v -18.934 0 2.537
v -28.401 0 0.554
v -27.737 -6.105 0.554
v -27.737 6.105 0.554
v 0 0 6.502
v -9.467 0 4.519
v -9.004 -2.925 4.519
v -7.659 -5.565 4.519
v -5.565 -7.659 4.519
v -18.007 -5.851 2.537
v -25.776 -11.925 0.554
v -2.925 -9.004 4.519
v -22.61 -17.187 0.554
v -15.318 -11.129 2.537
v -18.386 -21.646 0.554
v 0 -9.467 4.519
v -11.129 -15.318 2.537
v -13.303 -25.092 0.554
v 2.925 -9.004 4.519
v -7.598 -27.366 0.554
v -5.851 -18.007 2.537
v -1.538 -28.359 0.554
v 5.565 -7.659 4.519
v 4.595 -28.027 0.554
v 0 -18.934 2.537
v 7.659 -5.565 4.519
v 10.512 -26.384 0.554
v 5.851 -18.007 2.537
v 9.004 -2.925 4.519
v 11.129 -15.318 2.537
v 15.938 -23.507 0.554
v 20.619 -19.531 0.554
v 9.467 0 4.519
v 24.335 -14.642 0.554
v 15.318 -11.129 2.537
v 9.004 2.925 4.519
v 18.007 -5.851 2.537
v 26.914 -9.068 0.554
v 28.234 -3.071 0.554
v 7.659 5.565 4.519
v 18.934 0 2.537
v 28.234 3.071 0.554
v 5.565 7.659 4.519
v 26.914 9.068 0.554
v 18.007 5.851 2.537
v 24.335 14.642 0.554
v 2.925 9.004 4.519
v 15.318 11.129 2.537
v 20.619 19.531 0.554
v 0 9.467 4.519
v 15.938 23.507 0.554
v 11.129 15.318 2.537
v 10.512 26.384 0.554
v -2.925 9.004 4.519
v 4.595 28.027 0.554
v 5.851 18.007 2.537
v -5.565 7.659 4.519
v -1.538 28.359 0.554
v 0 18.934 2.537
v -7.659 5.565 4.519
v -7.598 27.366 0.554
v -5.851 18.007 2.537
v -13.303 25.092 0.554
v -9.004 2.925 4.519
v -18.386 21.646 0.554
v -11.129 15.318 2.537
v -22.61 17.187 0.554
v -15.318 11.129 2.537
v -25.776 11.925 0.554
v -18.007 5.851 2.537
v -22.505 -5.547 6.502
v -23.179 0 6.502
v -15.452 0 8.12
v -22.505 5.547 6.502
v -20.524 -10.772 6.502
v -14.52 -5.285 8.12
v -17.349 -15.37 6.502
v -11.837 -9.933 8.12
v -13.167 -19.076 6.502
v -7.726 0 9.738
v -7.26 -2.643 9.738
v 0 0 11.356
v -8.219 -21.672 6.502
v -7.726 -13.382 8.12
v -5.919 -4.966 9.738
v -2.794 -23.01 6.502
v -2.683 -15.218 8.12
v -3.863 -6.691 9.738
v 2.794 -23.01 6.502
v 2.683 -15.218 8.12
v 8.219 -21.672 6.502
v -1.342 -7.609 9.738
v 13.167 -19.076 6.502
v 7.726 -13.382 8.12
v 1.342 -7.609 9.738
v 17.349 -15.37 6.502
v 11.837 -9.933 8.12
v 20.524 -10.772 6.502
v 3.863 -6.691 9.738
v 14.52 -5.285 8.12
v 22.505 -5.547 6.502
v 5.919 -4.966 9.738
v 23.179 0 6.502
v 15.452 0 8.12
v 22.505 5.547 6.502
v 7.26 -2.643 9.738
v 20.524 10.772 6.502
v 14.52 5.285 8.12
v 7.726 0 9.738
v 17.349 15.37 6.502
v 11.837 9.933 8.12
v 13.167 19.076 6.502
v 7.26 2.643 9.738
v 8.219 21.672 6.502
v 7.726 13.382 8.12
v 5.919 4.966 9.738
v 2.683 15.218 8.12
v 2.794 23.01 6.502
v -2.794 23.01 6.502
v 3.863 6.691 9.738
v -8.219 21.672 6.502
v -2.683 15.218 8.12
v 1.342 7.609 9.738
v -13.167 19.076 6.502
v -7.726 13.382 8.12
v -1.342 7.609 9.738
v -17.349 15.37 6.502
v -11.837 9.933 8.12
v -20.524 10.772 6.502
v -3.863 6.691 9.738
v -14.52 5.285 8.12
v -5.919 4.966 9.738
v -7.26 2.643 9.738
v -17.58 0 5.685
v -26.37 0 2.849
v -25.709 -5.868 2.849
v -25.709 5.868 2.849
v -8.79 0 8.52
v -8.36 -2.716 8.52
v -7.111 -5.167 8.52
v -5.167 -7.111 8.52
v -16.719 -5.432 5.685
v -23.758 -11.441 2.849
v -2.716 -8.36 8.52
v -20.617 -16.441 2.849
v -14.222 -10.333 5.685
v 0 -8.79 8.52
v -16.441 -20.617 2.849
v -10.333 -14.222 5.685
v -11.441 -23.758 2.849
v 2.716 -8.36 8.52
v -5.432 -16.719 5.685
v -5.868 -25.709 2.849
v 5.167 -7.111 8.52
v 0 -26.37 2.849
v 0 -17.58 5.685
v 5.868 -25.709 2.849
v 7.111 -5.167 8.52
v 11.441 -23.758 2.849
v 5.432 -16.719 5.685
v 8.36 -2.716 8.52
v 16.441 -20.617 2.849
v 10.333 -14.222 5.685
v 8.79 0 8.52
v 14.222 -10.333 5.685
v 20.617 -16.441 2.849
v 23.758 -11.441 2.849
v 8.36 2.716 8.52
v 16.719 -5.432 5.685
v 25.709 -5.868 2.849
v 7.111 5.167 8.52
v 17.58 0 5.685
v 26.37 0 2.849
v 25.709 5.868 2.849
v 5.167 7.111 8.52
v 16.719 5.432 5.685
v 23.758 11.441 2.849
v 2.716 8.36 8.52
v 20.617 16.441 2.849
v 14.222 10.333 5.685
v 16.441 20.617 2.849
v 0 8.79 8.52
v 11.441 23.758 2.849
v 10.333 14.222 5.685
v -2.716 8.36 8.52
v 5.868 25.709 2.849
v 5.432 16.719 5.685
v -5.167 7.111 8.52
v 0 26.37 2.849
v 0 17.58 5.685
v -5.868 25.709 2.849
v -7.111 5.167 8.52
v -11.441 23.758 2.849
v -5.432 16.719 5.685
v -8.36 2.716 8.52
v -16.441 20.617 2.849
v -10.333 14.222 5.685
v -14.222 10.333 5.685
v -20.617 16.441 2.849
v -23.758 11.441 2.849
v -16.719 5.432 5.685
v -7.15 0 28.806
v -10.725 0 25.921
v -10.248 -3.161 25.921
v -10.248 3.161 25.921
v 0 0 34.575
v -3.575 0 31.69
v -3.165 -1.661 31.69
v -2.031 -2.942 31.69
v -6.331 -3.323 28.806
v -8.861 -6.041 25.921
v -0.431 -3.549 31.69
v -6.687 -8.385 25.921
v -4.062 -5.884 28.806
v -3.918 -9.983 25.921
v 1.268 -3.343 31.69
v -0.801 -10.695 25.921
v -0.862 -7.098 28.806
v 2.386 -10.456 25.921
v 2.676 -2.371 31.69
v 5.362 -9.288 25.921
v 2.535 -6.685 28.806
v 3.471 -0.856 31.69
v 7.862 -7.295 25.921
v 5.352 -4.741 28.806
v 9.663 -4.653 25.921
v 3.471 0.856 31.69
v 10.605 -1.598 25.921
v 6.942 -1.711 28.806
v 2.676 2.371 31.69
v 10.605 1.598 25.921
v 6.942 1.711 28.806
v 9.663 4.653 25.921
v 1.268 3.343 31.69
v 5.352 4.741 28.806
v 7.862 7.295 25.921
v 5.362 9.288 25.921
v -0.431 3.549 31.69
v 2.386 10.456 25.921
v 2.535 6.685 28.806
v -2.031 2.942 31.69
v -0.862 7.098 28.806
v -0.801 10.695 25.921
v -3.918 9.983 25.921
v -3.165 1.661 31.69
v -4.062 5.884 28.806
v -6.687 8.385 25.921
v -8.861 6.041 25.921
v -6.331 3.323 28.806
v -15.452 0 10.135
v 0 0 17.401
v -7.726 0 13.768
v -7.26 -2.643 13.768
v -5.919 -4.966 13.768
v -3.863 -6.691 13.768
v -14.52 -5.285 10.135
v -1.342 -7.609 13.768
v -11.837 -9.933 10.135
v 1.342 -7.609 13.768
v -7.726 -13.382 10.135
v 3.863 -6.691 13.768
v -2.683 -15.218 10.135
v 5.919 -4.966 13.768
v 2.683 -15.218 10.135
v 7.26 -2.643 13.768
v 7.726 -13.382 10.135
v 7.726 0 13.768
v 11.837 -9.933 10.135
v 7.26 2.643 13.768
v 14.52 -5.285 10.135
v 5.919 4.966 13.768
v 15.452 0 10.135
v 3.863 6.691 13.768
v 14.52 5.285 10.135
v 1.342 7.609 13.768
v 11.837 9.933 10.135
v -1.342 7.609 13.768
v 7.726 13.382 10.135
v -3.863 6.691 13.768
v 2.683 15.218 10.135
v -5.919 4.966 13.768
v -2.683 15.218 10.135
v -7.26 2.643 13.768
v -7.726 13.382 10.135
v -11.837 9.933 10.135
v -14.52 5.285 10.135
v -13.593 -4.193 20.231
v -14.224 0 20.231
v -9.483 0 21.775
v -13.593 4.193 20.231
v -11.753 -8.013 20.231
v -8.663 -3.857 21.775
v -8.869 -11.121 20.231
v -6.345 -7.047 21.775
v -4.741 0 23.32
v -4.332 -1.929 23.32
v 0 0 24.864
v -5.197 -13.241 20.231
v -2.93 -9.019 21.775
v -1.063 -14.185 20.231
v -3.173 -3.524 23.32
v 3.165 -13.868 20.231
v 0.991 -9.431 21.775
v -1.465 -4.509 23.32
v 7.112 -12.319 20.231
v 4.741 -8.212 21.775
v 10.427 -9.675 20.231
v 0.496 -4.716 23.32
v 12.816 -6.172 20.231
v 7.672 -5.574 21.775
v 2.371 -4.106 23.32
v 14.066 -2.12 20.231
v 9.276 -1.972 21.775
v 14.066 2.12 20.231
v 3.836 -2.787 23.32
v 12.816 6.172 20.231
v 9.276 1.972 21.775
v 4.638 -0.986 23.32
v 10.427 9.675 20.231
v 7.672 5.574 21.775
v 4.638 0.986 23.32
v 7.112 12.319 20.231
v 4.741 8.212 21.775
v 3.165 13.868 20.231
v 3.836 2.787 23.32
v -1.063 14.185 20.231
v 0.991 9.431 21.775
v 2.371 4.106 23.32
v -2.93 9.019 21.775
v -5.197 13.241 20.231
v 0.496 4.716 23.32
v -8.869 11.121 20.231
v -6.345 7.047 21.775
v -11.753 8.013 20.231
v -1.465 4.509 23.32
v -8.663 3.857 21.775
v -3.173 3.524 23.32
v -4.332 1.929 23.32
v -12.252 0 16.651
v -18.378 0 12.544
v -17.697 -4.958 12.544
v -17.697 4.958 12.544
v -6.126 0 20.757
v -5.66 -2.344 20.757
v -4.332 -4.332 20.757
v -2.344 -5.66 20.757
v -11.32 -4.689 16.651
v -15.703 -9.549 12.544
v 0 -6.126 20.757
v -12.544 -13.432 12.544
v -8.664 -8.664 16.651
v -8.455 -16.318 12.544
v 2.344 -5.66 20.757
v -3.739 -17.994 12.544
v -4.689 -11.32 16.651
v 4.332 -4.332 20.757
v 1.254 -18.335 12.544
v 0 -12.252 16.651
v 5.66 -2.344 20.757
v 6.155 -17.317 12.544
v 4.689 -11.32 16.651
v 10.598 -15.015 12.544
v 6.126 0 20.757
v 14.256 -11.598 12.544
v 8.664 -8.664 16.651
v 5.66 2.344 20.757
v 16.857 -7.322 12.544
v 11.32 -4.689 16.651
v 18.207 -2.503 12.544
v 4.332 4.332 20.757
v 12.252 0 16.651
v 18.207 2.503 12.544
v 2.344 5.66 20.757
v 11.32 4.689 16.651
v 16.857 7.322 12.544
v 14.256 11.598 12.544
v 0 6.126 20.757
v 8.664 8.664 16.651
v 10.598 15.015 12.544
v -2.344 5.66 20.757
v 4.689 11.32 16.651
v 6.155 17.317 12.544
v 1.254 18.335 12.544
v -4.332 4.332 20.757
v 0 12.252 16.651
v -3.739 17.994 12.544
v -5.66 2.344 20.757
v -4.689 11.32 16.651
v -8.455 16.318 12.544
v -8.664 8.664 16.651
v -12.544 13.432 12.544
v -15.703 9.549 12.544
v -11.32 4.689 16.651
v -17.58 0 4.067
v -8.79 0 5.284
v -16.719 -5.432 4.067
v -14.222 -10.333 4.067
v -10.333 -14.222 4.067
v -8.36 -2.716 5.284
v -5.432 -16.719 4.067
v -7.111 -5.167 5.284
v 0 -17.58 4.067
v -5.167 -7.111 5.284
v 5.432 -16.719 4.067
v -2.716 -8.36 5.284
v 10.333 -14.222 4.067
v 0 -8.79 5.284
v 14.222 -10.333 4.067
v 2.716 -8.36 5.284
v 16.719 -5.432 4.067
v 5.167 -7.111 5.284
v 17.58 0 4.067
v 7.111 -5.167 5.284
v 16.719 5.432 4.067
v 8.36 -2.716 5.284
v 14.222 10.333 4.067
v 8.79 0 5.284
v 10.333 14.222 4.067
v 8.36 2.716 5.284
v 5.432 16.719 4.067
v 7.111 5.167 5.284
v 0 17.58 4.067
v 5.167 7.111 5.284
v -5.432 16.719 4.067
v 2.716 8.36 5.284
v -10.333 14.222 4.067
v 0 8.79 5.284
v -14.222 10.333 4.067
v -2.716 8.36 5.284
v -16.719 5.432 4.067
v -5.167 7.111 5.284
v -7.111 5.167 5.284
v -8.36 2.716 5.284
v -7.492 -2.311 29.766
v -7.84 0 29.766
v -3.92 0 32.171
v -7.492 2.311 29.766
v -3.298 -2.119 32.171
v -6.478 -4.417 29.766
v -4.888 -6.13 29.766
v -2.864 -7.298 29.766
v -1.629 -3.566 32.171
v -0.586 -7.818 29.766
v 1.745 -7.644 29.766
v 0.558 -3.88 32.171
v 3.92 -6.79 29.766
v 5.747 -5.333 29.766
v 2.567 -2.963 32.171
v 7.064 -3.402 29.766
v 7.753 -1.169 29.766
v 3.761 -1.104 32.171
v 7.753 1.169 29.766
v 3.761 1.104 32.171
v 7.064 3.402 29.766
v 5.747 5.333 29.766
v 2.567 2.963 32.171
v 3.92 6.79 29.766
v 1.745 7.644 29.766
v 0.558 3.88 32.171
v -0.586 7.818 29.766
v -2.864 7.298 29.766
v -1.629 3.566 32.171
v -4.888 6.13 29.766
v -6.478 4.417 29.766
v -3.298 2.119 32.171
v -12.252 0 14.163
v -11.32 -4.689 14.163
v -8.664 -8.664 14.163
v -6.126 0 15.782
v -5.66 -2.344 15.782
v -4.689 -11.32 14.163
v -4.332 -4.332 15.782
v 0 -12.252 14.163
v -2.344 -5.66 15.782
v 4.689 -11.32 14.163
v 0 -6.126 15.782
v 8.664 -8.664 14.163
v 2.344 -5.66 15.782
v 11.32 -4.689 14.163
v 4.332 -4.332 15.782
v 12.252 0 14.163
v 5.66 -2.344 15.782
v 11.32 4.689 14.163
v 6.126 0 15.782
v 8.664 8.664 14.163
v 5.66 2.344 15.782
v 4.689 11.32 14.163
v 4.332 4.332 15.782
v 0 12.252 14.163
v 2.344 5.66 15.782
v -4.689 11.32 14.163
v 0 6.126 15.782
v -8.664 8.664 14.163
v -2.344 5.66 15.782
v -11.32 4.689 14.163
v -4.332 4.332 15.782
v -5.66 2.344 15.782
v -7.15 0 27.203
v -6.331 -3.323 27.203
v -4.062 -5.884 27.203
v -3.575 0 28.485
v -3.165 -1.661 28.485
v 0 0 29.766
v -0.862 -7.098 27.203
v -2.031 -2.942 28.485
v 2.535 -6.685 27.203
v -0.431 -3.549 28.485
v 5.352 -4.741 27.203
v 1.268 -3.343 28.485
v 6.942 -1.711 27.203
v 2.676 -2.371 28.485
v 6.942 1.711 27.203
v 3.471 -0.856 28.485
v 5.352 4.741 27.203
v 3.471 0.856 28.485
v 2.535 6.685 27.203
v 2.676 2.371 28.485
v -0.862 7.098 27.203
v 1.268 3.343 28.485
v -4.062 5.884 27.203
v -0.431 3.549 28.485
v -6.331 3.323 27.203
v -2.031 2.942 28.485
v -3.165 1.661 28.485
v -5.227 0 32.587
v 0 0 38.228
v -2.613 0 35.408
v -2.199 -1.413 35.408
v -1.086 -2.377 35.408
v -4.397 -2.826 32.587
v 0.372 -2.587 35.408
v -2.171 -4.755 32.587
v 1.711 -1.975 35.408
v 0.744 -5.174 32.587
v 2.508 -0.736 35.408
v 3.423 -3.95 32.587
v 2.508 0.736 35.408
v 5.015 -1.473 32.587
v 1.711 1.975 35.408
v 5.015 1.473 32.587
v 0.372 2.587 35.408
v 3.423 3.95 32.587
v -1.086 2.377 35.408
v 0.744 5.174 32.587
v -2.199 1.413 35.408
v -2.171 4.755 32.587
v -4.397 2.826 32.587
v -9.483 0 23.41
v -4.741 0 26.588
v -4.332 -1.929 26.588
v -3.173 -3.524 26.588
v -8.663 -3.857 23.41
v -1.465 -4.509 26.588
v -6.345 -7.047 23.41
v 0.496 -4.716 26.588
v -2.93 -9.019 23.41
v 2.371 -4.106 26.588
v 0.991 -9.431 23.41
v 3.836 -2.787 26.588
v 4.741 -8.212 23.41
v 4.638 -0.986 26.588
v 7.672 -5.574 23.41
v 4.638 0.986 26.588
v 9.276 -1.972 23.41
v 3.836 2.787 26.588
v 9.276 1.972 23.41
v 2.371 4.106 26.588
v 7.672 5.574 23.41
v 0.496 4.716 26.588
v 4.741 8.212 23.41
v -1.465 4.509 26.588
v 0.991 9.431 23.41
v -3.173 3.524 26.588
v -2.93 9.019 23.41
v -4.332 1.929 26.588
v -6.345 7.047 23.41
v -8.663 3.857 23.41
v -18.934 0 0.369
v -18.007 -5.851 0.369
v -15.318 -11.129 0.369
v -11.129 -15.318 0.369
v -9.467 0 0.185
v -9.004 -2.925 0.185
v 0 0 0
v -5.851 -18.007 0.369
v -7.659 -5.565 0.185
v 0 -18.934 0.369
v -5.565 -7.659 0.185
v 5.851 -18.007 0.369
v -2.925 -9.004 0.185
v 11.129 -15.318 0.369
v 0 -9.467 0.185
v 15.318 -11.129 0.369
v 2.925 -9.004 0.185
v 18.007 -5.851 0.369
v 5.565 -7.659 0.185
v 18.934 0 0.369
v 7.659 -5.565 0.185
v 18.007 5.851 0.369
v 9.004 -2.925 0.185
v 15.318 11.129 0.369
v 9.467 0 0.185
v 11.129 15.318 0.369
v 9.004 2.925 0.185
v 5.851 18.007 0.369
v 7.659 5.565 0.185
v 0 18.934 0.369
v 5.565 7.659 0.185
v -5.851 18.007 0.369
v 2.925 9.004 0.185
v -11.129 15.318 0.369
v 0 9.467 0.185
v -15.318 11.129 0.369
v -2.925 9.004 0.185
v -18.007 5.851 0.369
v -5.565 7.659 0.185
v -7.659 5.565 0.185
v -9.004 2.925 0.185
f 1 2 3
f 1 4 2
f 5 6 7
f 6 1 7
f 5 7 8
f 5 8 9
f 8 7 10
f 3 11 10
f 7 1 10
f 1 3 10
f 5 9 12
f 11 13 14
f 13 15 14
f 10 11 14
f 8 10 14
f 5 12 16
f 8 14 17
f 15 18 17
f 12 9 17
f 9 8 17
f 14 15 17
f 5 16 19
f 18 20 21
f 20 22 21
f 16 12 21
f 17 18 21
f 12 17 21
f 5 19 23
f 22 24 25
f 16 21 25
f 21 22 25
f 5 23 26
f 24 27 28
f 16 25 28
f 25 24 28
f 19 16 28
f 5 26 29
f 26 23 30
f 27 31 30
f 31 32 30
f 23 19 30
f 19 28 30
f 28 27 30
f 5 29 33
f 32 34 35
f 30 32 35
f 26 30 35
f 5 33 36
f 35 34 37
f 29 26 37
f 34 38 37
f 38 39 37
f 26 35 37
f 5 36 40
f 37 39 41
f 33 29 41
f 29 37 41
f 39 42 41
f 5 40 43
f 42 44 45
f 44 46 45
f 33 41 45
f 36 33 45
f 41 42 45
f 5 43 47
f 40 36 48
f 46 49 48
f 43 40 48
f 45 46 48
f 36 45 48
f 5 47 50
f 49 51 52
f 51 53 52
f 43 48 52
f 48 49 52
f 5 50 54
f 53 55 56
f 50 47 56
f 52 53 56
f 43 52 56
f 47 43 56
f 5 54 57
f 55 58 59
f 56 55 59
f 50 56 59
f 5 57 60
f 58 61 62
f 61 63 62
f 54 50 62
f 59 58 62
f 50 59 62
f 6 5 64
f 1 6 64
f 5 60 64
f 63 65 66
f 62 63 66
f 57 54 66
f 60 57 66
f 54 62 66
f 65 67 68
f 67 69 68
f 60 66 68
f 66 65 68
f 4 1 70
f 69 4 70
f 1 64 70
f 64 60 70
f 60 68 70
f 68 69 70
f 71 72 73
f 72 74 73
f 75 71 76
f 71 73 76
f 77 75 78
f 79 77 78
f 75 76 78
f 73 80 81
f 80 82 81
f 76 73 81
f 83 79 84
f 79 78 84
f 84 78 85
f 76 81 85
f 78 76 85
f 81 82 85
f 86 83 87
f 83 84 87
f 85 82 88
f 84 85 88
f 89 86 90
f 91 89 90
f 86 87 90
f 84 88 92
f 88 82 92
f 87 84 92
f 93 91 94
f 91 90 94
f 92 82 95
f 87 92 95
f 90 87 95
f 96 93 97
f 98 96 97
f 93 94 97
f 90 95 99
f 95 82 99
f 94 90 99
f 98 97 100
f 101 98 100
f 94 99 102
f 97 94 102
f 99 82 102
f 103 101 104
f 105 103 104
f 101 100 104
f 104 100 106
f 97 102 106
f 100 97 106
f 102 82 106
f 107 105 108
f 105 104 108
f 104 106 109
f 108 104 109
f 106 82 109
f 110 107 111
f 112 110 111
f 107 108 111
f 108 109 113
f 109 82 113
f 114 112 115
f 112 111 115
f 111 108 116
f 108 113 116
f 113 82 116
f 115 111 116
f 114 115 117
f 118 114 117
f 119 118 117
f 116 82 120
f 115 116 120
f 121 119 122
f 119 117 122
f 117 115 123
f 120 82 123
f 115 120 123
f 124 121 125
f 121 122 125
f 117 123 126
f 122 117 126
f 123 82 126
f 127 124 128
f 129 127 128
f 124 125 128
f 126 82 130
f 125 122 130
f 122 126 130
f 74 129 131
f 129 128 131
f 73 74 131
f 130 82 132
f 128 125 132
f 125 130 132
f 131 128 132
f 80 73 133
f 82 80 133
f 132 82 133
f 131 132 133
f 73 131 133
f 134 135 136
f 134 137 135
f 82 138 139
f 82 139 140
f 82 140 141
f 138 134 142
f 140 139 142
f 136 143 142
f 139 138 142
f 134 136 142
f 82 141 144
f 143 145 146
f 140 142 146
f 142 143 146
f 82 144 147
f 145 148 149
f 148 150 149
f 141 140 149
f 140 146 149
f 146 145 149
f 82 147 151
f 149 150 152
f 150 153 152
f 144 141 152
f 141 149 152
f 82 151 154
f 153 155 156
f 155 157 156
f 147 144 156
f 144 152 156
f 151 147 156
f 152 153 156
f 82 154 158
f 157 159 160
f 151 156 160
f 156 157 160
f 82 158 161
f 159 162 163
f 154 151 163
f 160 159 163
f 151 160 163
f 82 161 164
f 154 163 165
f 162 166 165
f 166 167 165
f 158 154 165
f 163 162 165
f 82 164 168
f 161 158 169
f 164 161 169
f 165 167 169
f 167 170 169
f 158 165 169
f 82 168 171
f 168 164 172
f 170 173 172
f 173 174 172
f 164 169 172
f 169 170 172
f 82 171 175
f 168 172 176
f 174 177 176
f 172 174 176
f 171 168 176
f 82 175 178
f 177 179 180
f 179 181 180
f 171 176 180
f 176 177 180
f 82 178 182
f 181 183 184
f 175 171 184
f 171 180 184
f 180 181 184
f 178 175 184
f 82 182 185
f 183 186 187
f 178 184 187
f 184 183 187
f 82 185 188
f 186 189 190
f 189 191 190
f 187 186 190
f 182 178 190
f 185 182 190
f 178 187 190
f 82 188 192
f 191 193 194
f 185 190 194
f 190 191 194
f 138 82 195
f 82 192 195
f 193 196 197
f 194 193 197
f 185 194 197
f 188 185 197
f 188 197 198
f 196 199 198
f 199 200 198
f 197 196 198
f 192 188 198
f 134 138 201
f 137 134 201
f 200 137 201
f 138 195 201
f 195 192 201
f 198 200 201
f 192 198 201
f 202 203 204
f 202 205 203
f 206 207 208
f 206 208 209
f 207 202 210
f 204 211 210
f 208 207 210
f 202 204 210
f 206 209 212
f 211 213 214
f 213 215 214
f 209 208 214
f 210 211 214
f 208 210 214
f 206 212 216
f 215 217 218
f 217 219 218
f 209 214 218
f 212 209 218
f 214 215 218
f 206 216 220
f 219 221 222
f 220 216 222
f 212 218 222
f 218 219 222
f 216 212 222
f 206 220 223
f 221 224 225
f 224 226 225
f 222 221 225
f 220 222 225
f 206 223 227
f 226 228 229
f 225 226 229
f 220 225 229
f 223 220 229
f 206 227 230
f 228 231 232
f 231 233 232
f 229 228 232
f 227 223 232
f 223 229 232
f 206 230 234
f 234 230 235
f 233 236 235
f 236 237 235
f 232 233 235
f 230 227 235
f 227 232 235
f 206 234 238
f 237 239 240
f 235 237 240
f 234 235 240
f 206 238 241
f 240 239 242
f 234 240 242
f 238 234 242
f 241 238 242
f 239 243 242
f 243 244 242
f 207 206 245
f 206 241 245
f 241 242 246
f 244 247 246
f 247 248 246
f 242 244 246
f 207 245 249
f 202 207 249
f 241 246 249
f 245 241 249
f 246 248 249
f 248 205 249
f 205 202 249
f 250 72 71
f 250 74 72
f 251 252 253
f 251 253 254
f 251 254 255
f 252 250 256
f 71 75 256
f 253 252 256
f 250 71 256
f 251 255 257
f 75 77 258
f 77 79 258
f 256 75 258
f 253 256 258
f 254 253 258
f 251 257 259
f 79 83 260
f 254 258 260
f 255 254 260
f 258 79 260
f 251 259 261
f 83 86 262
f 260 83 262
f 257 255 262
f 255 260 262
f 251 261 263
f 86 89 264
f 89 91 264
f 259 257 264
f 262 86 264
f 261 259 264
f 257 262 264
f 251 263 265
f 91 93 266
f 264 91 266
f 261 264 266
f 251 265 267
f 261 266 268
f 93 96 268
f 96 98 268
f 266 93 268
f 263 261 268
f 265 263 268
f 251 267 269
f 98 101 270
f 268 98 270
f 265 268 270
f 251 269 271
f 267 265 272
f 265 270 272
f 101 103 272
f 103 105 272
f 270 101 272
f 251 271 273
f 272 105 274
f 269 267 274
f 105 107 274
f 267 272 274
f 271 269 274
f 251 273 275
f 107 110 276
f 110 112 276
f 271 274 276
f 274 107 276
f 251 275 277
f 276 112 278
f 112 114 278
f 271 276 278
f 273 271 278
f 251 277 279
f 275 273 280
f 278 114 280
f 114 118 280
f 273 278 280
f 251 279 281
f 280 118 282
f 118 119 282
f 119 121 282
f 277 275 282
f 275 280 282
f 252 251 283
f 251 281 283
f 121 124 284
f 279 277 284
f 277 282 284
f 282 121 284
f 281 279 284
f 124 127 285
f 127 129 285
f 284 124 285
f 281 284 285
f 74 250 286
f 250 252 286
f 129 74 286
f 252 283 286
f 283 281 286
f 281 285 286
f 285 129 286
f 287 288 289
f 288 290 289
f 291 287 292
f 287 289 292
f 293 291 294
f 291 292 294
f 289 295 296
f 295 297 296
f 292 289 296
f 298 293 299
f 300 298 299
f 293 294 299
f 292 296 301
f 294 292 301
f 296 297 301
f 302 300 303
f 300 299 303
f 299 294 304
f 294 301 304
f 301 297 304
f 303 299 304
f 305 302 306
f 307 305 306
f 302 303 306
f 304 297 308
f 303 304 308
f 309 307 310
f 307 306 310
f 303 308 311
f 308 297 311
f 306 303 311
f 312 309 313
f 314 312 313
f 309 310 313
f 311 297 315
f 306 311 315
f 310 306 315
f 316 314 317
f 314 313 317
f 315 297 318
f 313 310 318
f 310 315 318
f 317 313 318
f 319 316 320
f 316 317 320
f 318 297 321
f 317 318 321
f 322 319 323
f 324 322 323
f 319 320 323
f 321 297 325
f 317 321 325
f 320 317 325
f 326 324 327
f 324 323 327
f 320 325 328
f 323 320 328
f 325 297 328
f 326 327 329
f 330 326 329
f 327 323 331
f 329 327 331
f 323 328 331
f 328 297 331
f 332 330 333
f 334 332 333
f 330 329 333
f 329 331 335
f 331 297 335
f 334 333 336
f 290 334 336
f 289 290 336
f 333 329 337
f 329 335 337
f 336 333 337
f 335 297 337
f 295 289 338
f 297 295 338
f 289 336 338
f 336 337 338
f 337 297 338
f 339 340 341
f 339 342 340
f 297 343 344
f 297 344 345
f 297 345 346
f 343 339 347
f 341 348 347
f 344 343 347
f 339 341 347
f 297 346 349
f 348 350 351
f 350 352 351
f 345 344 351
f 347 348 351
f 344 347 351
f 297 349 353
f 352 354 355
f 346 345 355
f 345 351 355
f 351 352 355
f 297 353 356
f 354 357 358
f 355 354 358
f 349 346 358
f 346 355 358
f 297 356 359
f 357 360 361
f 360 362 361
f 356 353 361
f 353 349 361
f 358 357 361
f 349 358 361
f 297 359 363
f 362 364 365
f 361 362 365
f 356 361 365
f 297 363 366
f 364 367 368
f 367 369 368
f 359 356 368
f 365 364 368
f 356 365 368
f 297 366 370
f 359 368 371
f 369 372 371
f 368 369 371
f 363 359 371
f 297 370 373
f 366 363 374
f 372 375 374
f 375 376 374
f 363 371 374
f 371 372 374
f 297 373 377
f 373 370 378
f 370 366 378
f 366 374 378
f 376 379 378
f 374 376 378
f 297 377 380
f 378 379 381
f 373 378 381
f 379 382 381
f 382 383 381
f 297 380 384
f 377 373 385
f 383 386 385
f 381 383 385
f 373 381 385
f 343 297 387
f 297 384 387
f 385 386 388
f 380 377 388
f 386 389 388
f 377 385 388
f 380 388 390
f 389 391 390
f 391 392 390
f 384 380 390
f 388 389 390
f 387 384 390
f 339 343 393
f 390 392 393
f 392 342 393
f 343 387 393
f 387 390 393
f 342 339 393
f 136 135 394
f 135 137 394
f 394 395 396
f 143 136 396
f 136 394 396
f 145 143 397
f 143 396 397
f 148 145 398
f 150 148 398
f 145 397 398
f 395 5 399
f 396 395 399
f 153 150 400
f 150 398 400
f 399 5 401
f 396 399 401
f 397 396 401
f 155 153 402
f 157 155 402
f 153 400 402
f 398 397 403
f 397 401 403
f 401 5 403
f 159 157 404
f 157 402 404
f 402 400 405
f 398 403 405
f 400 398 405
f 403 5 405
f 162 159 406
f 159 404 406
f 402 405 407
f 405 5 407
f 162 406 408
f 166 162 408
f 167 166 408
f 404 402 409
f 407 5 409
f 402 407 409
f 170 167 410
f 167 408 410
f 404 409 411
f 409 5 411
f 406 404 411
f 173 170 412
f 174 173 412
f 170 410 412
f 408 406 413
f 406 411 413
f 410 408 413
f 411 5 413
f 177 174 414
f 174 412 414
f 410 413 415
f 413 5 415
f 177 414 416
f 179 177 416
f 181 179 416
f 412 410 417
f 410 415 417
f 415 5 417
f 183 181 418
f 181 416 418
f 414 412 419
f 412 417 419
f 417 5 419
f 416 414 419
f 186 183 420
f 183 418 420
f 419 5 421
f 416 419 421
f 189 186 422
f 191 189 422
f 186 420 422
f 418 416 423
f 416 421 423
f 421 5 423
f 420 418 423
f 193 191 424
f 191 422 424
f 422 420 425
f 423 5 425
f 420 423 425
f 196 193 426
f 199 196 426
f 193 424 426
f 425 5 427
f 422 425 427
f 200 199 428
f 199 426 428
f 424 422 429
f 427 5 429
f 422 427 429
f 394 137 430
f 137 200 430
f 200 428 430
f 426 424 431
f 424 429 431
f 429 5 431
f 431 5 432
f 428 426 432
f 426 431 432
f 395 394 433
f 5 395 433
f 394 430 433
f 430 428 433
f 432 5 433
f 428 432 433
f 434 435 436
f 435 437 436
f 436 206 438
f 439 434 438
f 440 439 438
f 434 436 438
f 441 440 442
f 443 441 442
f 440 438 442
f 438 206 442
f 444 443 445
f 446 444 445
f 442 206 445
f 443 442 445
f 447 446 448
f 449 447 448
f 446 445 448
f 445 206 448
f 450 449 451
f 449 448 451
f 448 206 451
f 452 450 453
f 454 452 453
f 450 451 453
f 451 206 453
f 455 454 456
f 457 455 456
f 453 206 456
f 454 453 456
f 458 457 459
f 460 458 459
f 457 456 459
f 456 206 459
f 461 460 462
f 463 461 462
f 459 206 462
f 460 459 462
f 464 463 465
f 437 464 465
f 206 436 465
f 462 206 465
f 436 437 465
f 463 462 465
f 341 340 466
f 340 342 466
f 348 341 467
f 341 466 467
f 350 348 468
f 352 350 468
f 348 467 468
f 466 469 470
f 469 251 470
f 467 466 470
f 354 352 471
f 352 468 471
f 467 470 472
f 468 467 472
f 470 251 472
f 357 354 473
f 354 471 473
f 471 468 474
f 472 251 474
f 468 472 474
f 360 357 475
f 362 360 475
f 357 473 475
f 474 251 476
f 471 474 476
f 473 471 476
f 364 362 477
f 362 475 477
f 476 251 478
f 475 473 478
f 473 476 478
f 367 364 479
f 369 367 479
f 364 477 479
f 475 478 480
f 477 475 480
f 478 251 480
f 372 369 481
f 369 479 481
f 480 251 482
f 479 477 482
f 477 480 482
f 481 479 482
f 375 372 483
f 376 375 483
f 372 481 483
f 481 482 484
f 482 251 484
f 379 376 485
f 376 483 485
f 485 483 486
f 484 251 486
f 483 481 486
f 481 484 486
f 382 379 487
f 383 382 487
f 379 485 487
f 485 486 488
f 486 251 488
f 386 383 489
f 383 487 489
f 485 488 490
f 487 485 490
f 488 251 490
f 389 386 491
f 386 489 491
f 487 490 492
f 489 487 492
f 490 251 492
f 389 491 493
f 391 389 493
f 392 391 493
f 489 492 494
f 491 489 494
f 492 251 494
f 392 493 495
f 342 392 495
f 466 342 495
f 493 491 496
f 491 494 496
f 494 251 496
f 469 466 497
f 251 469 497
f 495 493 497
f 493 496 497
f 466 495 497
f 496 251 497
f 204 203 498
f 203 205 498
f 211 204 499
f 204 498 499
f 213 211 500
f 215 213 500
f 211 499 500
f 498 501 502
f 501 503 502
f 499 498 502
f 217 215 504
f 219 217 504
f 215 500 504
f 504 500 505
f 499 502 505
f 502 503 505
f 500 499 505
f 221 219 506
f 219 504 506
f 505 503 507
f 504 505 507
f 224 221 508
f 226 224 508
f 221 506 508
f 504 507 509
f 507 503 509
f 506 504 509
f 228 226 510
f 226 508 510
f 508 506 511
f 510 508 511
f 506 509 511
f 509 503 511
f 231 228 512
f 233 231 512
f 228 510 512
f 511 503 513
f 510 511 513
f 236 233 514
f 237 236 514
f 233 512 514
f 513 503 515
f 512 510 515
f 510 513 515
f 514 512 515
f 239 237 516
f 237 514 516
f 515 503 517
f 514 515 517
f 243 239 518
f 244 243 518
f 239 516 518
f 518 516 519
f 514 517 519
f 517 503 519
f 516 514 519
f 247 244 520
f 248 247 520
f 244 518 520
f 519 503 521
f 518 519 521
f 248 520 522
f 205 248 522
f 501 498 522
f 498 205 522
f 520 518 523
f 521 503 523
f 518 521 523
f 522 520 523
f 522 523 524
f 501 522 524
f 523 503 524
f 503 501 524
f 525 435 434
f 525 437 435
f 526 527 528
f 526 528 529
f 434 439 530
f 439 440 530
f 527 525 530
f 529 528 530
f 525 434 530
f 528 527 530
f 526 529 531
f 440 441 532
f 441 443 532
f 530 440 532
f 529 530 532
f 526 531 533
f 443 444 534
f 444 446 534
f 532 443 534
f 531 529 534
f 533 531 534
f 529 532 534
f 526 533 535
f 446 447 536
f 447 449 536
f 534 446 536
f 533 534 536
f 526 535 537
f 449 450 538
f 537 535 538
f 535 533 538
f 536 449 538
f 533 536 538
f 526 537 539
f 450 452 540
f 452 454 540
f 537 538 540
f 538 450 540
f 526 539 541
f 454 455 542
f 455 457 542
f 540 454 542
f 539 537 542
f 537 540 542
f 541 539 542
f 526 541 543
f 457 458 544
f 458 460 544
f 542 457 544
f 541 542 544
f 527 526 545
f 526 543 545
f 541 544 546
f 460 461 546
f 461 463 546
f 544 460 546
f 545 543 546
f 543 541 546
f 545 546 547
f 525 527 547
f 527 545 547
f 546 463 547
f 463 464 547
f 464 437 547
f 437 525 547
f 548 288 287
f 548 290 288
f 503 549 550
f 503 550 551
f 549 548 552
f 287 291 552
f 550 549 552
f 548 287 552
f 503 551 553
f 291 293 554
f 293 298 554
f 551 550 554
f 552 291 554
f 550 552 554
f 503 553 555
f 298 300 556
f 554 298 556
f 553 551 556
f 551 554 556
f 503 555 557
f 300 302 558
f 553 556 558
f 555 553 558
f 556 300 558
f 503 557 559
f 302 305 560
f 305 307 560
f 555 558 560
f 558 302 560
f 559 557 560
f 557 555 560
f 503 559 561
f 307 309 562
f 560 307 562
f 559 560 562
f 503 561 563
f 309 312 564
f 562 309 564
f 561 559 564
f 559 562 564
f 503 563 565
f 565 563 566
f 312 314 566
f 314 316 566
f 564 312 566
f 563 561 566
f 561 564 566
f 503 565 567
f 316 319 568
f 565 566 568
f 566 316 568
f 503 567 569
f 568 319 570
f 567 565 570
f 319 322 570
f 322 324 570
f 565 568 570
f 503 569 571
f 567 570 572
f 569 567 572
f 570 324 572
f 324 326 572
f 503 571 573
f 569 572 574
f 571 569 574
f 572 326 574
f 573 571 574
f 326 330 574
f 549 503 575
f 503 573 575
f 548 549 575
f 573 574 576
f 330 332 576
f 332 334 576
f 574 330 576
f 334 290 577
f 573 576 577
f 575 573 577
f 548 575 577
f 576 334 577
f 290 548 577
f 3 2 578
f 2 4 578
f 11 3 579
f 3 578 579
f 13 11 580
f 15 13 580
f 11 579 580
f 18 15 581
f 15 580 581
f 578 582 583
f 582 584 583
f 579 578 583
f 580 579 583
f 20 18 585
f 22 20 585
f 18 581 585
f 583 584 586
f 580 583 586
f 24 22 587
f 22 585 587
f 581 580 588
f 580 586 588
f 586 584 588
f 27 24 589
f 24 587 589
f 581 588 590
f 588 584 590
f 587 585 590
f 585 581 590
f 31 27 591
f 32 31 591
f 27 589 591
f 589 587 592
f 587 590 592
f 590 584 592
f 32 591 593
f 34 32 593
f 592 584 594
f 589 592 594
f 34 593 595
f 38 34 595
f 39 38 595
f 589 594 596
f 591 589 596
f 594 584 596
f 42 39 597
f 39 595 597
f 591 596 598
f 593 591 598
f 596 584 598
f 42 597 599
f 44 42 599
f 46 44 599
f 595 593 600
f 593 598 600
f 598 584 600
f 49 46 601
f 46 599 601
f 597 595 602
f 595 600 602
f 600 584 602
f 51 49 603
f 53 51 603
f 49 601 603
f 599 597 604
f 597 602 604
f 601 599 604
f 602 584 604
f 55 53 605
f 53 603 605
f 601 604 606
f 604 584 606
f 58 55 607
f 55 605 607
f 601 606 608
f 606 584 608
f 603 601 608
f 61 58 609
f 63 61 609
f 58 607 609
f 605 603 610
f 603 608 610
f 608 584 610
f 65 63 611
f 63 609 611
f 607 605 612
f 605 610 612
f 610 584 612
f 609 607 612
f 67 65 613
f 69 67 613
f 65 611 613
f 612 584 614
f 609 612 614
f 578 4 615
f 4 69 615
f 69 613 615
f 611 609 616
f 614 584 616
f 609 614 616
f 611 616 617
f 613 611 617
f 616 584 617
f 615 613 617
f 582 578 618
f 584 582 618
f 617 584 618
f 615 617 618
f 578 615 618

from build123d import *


with BuildPart() as f1:
    # F0 (on Front) → F1 (revolve)
    with BuildSketch(Plane.XZ):
        Polygon((-18.378321, 12.543931), (0, 17.401084), (0, 24.863643), align=None)
        Polygon((-14.224454, 20.231253), (0, 24.863643), (0, 29.766465), align=None)
        Polygon((-7.840419, 29.766465), (0, 34.57471), (0, 38.228185), align=None)
        Polygon((-10.724778, 25.921121), (0, 29.766465), (0, 34.57471), align=None)
        Polygon((-23.178546, 6.501715), (0, 11.355646), (0, 17.401084), align=None)
        Polygon((-26.369773, 2.849298), (0, 6.501715), (0, 11.355646), align=None)
        Polygon((-28.400787, 0.55417), (0, 0), (0, 6.501715), align=None)
    revolve(axis=Axis((0, 0, 19.114093), (0, 0, 1)))


solid = f1.part
